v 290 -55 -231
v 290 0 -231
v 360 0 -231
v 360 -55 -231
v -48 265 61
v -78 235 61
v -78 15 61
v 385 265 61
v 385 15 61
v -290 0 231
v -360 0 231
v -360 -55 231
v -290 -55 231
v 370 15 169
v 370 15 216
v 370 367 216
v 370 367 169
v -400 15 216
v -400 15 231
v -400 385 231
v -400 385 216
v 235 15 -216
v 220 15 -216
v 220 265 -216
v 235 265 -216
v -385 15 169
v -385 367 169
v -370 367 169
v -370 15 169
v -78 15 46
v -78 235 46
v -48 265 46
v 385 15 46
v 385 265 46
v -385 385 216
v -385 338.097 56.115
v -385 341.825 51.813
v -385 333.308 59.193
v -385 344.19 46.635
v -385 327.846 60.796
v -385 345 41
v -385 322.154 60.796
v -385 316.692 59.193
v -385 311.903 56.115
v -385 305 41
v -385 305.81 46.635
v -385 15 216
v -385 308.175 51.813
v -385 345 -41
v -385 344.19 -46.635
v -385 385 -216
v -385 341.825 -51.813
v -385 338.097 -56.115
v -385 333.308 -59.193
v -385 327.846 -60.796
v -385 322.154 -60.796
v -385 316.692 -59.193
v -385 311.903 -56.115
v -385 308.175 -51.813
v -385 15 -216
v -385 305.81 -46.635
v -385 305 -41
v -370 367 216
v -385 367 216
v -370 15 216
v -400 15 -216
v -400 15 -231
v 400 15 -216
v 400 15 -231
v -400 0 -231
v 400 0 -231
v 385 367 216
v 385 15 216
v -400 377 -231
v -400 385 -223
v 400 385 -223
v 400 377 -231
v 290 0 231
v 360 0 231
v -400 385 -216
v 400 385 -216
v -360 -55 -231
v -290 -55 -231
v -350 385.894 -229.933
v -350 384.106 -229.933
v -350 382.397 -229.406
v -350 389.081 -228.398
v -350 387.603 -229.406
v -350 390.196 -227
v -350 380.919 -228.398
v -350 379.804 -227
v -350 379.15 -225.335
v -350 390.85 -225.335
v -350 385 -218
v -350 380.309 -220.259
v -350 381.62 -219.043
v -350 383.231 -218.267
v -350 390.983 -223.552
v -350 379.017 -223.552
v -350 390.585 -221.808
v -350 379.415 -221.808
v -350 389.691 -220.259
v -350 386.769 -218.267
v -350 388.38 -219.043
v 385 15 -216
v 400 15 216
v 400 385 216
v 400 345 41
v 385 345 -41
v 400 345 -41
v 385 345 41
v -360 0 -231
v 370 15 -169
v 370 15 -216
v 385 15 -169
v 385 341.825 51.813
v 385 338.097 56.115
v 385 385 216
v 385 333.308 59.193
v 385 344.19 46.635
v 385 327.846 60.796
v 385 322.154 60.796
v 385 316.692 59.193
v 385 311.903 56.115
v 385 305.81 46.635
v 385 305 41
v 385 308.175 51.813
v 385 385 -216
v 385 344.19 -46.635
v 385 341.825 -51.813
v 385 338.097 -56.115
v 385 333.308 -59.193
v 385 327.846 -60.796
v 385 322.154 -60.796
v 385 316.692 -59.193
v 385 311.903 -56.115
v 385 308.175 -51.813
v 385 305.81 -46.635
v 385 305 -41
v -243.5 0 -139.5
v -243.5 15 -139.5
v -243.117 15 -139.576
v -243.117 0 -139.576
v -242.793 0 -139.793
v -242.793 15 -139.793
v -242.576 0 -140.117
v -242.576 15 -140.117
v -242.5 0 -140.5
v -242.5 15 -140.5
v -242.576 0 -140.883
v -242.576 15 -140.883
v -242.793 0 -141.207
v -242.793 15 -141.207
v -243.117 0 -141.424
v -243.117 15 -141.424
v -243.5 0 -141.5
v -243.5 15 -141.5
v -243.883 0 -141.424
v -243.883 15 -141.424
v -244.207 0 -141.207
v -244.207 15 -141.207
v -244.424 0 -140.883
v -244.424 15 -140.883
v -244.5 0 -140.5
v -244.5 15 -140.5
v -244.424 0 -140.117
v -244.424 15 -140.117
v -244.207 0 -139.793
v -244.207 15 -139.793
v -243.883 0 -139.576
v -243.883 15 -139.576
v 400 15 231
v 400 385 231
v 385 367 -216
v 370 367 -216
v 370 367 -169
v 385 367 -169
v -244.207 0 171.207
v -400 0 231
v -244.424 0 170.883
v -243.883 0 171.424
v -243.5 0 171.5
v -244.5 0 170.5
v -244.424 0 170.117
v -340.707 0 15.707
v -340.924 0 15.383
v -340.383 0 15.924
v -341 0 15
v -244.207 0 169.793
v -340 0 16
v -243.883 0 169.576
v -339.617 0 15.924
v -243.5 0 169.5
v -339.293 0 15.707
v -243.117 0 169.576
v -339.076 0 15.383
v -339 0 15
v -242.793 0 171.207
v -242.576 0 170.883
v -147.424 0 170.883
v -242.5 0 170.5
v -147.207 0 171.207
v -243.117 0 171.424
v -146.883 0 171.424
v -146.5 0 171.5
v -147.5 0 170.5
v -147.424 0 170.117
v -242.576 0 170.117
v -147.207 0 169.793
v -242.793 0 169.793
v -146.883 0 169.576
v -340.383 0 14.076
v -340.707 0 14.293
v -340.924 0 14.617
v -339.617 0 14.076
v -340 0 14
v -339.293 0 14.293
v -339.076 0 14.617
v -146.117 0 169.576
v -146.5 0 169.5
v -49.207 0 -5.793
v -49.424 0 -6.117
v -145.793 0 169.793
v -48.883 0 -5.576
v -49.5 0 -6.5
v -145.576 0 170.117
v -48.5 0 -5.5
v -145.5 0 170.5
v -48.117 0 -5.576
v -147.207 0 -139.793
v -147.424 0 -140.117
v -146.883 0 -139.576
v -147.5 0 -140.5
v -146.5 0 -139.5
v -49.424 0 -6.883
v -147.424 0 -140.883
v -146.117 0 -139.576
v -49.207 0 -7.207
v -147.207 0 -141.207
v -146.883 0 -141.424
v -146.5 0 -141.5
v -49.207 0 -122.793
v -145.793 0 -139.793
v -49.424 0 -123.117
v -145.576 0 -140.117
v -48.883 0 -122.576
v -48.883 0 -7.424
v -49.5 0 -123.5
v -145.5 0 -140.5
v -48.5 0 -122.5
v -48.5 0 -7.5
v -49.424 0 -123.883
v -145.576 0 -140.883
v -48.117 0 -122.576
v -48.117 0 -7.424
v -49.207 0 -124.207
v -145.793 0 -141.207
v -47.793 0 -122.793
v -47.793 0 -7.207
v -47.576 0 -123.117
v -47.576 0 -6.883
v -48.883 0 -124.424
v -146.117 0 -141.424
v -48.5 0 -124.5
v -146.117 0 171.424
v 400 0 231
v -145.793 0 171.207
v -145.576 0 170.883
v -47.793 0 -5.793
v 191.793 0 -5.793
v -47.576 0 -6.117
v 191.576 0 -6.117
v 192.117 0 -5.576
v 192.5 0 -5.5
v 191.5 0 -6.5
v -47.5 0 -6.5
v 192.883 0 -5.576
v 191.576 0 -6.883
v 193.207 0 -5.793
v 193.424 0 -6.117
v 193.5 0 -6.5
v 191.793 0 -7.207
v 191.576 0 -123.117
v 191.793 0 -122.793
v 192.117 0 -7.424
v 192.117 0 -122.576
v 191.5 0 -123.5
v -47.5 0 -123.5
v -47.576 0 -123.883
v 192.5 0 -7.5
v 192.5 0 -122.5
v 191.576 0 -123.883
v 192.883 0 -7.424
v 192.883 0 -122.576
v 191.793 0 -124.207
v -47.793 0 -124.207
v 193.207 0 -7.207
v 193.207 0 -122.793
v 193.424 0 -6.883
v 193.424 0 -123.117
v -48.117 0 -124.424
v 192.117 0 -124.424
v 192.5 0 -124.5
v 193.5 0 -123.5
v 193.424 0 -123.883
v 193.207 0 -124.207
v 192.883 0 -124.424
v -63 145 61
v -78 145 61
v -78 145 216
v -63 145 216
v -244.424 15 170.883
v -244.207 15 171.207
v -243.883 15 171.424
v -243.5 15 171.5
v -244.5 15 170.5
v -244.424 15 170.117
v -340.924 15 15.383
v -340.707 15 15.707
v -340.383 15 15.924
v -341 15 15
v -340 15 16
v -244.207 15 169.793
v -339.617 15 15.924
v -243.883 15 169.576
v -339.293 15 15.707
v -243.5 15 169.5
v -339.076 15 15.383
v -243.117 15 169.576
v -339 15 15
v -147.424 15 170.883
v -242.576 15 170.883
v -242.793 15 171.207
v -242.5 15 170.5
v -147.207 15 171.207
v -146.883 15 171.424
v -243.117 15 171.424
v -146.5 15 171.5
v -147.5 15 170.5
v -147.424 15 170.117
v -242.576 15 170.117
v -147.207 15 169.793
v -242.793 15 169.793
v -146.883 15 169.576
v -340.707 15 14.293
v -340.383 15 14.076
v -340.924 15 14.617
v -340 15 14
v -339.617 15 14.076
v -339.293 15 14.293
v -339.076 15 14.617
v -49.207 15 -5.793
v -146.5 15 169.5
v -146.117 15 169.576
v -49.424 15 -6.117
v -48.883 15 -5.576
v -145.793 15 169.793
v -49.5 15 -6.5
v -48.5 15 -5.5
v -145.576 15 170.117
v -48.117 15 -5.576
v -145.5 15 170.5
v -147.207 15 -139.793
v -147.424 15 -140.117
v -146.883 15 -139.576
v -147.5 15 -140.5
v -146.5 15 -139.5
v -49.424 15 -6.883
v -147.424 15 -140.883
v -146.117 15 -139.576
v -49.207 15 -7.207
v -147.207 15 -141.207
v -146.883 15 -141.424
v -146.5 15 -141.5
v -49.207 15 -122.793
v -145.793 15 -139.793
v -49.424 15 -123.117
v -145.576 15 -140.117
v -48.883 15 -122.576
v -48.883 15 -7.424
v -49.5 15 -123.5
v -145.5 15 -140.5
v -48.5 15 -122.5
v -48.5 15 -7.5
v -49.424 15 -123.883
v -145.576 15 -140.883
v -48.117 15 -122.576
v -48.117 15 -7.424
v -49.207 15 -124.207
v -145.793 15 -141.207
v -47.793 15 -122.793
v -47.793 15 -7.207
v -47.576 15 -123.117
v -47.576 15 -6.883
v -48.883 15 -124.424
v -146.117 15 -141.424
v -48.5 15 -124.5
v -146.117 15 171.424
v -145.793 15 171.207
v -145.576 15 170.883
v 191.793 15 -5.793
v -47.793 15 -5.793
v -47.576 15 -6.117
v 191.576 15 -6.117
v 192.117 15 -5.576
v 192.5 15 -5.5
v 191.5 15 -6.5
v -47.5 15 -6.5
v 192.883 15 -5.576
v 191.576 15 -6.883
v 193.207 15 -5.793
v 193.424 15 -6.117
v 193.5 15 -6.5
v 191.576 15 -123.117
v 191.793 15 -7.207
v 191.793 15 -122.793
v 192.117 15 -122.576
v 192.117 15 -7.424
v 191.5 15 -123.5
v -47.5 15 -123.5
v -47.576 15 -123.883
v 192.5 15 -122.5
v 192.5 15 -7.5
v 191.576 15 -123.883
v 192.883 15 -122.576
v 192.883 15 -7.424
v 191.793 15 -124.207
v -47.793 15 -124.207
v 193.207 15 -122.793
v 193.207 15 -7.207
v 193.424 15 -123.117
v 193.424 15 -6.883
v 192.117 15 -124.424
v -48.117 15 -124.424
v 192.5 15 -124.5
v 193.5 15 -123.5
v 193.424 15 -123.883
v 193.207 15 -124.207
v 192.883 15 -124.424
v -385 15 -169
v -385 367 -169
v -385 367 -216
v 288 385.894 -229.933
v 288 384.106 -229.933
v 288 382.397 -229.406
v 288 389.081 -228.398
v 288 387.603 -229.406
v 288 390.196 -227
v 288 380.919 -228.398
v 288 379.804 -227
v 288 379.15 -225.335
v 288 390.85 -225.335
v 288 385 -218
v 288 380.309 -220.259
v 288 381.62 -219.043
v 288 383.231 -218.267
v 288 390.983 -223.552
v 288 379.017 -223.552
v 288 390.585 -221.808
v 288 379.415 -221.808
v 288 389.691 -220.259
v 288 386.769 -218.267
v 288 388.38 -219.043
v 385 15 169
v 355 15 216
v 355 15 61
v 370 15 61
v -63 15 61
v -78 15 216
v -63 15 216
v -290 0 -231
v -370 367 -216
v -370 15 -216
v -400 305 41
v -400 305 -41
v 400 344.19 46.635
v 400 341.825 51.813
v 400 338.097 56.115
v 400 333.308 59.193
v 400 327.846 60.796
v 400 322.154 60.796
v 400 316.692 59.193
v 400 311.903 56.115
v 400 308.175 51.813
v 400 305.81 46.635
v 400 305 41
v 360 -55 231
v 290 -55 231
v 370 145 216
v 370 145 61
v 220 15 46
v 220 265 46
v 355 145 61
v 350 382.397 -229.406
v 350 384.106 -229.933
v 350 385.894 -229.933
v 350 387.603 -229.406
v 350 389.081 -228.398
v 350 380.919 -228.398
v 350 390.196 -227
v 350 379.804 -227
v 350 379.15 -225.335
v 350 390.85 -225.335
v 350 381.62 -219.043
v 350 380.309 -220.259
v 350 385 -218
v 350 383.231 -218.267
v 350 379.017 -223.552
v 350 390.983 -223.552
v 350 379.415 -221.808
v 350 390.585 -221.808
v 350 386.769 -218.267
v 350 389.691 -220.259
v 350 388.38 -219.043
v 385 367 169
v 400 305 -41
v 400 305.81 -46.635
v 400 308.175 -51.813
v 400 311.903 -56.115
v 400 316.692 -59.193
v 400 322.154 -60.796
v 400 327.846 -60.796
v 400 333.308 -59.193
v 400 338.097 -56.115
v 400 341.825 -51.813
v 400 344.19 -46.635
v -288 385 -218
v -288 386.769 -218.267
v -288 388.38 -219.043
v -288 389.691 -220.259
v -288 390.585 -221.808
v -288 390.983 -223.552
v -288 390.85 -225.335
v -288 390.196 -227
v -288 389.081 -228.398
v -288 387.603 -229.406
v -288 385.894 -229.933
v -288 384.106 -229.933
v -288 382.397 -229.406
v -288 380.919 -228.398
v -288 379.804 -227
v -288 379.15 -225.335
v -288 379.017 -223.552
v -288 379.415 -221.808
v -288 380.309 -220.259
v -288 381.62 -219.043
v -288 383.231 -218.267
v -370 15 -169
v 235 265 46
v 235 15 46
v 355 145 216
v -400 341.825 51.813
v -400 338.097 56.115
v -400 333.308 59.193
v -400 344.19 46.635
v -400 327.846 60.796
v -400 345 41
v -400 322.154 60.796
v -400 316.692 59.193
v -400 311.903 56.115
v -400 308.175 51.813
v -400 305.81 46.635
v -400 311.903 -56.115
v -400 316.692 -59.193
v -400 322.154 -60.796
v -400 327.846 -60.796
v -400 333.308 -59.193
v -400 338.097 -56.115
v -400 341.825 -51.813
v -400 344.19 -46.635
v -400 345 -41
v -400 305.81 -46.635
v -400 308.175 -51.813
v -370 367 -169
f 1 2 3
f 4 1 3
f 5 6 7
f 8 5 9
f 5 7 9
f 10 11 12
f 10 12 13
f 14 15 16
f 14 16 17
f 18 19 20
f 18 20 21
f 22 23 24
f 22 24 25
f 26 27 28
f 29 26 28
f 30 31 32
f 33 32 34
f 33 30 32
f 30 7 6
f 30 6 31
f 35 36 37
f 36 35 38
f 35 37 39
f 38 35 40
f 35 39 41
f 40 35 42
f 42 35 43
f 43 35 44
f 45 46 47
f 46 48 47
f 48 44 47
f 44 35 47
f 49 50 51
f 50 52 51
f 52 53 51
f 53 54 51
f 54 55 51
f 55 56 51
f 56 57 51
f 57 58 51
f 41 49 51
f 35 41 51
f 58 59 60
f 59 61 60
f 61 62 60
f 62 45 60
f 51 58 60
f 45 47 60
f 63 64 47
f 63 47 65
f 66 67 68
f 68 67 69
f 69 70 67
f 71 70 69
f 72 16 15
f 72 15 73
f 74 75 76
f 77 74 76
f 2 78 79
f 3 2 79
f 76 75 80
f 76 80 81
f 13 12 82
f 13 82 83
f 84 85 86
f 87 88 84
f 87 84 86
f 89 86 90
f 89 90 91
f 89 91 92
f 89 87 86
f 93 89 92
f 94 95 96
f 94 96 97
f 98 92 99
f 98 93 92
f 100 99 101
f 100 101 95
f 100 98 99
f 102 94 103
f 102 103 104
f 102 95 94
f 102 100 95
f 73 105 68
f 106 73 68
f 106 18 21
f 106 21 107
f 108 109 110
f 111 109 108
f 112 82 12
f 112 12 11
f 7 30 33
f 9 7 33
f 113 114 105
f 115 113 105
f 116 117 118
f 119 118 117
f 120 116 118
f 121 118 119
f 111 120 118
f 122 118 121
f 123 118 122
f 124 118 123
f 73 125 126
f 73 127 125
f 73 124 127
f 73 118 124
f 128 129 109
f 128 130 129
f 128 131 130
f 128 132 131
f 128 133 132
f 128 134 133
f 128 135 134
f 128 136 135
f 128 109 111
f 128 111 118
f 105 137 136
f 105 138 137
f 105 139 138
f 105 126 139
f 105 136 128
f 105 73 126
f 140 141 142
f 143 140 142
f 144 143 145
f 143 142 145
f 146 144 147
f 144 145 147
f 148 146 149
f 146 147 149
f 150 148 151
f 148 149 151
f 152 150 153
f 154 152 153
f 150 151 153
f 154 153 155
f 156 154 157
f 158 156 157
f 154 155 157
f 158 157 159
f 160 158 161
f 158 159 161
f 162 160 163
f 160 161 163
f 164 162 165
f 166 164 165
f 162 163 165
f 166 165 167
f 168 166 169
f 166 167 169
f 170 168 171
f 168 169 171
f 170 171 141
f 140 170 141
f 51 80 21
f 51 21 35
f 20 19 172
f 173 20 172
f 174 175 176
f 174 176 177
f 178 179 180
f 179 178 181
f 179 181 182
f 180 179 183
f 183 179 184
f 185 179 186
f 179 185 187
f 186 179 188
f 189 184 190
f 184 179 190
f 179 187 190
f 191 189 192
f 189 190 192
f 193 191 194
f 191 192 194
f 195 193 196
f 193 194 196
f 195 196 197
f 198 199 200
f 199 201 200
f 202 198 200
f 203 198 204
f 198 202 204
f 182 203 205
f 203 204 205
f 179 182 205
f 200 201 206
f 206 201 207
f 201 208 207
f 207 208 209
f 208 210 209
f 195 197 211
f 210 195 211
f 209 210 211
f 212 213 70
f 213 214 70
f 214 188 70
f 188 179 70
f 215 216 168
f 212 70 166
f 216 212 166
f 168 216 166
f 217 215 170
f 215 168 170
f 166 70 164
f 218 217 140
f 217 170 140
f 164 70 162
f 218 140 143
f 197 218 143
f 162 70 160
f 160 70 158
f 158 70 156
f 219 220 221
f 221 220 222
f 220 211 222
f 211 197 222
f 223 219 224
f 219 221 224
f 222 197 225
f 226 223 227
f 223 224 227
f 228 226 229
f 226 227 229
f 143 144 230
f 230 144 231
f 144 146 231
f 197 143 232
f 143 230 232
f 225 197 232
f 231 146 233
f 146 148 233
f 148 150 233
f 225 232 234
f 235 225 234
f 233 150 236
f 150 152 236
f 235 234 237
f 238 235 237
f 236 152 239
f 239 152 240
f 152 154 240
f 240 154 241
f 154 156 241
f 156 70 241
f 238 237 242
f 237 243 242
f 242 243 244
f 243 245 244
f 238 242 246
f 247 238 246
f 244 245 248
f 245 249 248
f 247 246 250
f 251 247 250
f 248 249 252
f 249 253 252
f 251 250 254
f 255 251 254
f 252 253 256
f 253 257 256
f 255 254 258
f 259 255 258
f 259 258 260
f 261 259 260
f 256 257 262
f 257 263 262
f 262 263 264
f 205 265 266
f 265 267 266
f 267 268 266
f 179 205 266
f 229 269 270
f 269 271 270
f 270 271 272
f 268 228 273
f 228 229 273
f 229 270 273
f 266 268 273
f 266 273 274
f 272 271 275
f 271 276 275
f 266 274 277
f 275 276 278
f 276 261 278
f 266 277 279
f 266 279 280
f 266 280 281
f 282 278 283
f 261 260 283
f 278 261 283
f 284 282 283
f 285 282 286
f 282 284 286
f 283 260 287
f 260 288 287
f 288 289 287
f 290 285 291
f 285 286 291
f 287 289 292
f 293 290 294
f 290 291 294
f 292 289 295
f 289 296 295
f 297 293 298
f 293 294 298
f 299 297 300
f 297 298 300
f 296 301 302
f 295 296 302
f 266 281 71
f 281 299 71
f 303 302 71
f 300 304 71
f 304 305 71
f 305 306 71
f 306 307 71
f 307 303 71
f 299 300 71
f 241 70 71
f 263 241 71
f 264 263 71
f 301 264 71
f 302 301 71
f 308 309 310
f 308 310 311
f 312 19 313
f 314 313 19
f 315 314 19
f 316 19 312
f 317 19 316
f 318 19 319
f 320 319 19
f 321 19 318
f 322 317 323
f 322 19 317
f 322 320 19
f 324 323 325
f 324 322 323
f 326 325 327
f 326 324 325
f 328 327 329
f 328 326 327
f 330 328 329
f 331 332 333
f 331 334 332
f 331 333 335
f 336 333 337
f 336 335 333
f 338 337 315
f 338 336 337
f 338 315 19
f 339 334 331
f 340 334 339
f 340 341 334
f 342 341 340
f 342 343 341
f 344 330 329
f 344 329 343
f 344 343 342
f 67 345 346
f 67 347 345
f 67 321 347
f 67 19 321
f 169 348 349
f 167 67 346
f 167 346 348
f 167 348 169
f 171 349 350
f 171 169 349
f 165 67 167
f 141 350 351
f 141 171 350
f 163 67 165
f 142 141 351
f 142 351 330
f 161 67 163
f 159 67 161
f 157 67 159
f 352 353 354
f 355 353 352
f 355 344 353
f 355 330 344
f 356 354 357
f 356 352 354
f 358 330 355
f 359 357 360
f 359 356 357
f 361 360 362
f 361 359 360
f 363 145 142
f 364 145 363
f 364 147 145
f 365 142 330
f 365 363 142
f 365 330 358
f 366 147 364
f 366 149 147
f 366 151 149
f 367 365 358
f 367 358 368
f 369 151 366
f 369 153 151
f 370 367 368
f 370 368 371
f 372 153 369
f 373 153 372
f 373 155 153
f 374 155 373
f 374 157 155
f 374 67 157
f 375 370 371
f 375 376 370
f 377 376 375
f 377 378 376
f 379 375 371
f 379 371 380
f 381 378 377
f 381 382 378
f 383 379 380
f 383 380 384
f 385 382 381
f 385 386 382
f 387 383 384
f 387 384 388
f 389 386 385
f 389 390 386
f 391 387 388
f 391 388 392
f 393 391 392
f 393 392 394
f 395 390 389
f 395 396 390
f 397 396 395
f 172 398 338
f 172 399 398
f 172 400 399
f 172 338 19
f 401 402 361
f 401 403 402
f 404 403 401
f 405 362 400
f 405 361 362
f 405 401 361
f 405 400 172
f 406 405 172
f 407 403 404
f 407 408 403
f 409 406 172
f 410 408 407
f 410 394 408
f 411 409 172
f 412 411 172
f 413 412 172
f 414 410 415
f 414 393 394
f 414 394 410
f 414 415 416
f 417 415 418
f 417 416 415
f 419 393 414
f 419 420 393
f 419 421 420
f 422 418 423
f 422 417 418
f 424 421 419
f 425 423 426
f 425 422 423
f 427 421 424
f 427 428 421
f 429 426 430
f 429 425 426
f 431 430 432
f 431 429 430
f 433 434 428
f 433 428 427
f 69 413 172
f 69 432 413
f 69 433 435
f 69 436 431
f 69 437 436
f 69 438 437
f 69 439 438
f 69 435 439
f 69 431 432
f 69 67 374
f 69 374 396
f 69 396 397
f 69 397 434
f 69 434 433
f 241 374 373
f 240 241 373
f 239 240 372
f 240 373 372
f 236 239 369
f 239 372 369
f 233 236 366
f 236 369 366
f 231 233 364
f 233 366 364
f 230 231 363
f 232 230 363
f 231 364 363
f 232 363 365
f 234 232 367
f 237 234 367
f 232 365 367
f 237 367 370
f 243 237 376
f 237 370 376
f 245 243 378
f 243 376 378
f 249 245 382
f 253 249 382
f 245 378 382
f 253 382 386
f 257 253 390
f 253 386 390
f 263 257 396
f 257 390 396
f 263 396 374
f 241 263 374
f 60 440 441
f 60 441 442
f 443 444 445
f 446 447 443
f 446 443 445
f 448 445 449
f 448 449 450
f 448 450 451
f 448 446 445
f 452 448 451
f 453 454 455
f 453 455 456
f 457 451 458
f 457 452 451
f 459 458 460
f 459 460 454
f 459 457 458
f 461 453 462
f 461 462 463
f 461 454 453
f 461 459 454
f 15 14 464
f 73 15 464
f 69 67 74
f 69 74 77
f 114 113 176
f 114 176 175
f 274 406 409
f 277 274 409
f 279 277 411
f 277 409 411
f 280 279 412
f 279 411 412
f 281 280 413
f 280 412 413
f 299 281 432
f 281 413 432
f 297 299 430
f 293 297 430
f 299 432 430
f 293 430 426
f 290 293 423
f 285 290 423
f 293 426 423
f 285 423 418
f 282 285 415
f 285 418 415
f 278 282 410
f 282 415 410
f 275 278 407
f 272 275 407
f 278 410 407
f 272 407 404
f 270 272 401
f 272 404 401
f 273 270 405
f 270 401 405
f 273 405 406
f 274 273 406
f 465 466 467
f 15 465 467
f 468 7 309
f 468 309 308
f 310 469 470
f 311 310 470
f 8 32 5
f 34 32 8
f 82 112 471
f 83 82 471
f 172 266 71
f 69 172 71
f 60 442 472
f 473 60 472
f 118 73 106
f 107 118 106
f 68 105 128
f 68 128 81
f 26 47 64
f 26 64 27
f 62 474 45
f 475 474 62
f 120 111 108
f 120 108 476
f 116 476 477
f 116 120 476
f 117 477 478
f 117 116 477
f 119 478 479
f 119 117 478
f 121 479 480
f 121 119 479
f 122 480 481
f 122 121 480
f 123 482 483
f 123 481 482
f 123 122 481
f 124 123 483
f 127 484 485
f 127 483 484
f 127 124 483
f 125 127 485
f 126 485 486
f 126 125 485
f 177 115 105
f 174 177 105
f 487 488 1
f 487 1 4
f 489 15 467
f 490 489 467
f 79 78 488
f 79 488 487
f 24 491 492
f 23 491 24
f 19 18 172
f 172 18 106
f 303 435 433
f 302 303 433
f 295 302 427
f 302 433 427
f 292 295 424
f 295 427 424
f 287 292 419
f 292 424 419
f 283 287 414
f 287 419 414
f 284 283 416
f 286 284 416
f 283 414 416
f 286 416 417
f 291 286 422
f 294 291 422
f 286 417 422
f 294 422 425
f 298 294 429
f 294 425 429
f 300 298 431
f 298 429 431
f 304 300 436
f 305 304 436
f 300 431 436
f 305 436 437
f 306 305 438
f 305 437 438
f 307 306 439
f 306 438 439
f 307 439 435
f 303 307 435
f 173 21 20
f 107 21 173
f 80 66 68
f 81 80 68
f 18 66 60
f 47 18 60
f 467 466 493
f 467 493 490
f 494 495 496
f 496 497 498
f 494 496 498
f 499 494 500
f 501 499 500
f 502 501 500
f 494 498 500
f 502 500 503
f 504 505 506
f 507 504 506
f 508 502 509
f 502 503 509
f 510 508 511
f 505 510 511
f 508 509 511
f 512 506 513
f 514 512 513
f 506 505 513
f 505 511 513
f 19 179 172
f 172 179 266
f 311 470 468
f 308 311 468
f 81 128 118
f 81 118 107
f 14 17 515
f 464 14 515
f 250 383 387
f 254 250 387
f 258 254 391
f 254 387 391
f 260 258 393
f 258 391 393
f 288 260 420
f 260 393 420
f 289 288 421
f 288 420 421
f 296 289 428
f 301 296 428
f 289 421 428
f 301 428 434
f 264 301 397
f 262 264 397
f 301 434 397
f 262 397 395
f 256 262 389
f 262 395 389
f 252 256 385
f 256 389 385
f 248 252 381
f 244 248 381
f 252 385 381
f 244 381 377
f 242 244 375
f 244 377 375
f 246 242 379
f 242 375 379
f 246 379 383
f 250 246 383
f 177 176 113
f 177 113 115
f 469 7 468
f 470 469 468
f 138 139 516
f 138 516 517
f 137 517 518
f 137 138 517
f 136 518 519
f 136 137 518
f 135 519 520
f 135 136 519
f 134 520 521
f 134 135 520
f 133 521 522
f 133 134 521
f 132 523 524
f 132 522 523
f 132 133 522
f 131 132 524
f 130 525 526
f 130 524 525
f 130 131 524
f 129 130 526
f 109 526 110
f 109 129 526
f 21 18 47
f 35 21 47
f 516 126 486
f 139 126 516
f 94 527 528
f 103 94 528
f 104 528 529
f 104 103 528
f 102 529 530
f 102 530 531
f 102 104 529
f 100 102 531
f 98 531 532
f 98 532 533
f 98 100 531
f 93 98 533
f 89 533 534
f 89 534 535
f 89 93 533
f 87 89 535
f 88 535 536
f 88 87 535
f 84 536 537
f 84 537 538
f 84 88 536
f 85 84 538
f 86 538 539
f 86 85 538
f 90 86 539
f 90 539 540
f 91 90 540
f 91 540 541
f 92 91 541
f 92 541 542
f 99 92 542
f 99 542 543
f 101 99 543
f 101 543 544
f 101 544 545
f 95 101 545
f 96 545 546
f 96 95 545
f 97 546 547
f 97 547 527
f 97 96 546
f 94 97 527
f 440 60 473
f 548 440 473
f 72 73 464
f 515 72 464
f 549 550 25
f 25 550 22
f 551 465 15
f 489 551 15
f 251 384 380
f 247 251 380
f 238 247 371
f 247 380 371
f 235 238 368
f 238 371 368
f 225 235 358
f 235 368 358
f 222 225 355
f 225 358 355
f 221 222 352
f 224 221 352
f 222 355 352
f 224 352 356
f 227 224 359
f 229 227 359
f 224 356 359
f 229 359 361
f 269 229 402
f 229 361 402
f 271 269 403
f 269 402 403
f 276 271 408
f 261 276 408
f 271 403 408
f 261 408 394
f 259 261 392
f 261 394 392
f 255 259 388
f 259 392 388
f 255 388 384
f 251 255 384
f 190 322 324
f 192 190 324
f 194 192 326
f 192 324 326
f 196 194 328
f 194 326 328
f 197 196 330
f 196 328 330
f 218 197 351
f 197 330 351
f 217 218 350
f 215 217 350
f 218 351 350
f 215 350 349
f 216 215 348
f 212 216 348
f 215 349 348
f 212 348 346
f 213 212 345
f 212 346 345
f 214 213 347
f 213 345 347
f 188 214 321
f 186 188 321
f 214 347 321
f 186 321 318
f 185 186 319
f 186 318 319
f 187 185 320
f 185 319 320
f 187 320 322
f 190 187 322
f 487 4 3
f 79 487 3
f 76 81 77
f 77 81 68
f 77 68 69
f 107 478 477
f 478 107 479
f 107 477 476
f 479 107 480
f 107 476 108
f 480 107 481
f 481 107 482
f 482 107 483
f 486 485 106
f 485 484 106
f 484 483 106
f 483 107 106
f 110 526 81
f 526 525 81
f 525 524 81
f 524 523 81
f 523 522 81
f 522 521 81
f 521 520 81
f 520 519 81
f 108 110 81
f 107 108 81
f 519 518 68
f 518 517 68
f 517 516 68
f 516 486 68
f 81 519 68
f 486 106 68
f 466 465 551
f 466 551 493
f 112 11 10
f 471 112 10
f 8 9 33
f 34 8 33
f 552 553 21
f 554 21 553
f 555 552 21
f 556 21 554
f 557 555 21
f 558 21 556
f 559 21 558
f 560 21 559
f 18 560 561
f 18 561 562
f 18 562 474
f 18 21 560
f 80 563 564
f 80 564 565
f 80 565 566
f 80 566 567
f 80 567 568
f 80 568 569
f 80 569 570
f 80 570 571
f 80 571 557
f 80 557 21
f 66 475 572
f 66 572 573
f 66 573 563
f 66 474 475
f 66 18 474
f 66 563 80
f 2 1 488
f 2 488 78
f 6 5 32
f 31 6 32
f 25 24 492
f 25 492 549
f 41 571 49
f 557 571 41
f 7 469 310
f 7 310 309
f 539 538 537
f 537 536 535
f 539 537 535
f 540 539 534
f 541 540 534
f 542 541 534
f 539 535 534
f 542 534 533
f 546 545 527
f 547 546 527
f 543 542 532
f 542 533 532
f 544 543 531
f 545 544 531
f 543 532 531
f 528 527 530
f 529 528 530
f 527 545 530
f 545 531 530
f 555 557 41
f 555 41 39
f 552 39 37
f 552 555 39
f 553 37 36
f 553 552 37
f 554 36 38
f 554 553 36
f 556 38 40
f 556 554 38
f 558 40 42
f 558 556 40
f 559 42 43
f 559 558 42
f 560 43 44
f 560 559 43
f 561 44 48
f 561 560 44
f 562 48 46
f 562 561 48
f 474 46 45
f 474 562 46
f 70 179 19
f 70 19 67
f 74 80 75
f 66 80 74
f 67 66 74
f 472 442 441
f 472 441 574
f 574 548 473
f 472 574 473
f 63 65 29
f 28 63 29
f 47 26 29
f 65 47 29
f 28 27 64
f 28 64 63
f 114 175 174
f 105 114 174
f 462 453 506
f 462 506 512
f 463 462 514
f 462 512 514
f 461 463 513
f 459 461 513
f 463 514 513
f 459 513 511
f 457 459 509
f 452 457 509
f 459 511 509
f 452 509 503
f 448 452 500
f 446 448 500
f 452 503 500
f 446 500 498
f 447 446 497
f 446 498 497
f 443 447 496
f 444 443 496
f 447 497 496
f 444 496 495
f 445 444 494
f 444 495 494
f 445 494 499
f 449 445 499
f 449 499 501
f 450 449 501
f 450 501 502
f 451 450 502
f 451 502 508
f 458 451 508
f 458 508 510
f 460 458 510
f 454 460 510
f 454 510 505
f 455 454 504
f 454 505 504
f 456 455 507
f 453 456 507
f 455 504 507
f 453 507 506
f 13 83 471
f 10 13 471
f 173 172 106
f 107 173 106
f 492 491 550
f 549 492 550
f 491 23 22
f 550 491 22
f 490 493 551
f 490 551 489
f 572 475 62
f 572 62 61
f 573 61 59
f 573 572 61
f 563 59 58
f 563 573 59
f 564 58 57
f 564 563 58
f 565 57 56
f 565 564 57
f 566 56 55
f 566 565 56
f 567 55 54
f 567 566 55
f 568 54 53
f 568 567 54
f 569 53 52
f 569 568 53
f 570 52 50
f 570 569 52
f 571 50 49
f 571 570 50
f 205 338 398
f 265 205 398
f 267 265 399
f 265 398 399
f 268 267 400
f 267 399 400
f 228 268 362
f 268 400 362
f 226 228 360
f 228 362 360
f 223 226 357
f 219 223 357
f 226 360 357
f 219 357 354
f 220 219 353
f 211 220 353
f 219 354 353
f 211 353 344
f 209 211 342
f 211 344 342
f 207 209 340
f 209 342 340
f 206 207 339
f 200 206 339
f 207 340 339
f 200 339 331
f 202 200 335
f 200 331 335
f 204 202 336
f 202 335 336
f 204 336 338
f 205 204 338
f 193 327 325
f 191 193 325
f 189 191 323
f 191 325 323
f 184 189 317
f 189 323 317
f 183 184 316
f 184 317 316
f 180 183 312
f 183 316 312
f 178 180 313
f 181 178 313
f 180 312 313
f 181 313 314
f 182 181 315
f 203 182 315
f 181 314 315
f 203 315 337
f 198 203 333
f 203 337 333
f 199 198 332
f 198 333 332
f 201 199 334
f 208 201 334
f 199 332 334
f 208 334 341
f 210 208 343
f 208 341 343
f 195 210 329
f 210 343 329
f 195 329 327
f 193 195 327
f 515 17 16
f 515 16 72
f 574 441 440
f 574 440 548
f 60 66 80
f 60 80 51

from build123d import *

# Parameters (mm, degrees)
ESQUISSE1_W             = 800
ESQUISSE1_H             = 462
BOSS_EXTRU_1_DEPTH      = 15
ESQUISSE2_W             = 70
ESQUISSE2_H             = 55
BOSS_EXTRU_2_DEPTH      = 462
BOSS_EXTRU_2_2_DEPTH    = 462
ESQUISSE3_W             = 800
ESQUISSE3_H             = 15
BOSS_EXTRU_3_DEPTH      = 370
BOSS_EXTRU_3_2_DEPTH    = 370
ESQUISSE4_W             = 15
ESQUISSE4_H             = 432
BOSS_EXTRU_4_DEPTH      = 370
BOSS_EXTRU_4_2_DEPTH    = 370
ESQUISSE5_W             = 15
ESQUISSE5_H             = 47
BOSS_EXTRU_5_DEPTH      = 352
BOSS_EXTRU_5_2_DEPTH    = 352
BOSS_EXTRU_5_3_DEPTH    = 352
BOSS_EXTRU_5_4_DEPTH    = 352
ENL_V_MAT_EXTRU_1_DEPTH = 918.3799649
BOSS_EXTRU_7_START      = -50
ESQUISSE8_R             = 6
BOSS_EXTRU_7_DEPTH      = 62
CHANFREIN1_SIZE         = 8
ESQUISSE9_W             = 15
ESQUISSE9_H             = 155
BOSS_EXTRU_8_DEPTH      = 130
BOSS_EXTRU_8_2_DEPTH    = 130
ESQUISSE10_W            = 463
ESQUISSE10_H            = 15
BOSS_EXTRU_9_DEPTH      = 250
ESQUISSE11_W            = 15
ESQUISSE11_H            = 262
BOSS_EXTRU_10_DEPTH     = 250
CHANFREIN2_SIZE         = 30
ESQUISSE12_R            = 1
ENL_V_MAT_EXTRU_2_DEPTH = 15


with BuildPart() as part:
    # Esquisse1 → Boss.-Extru.1 (new body)
    with BuildSketch(Plane(origin=(0, 0, 0), x_dir=(1, 0, 0), z_dir=(0, 1, 0))):
        Rectangle(ESQUISSE1_W, ESQUISSE1_H)
    extrude(amount=BOSS_EXTRU_1_DEPTH)

    # Esquisse12 → Enlèv. mat.-Extru.2 (cut)
    with BuildSketch(Plane(origin=(0, 15, 0), x_dir=(1, 0, 0), z_dir=(0, 1, 0))):
        with Locations(Location((-243.5, 140.5, 0), (0, 0, 270))):
            Circle(ESQUISSE12_R)
        with Locations(Location((-48.5, 123.5, 0), (0, 0, 270))):
            Circle(ESQUISSE12_R)
        with Locations(Location((-146.5, 140.5, 0), (0, 0, 90))):
            Circle(ESQUISSE12_R)
        with Locations(Location((192.5, 123.5, 0), (0, 0, 90))):
            Circle(ESQUISSE12_R)
        with Locations(Location((-48.5, 6.5, 0), (0, 0, 90))):
            Circle(ESQUISSE12_R)
        with Locations(Location((192.5, 6.5, 0), (0, 0, 270))):
            Circle(ESQUISSE12_R)
        with Locations(Location((-243.5, -170.5, 0), (0, 0, 90))):
            Circle(ESQUISSE12_R)
        with Locations(Location((-146.5, -170.5, 0), (0, 0, 270))):
            Circle(ESQUISSE12_R)
        with Locations(Location((-340, -15, 0), (0, 0, 270))):
            Circle(ESQUISSE12_R)
    extrude(amount=-ENL_V_MAT_EXTRU_2_DEPTH, mode=Mode.SUBTRACT)


with BuildPart() as body_2:
    # Esquisse2 → Boss.-Extru.2 (new body)
    with BuildSketch(Plane.XY.offset(231)):
        with Locations((-325, -27.5)):
            Rectangle(ESQUISSE2_W, ESQUISSE2_H)
    extrude(amount=-BOSS_EXTRU_2_DEPTH)


with BuildPart() as body_3:
    # Esquisse2 → Boss.-Extru.2 2 (new body)
    with BuildSketch(Plane.XY.offset(231)):
        with Locations((325, -27.5)):
            Rectangle(ESQUISSE2_W, ESQUISSE2_H)
    extrude(amount=-BOSS_EXTRU_2_2_DEPTH)


with BuildPart() as body_4:
    # Esquisse3 → Boss.-Extru.3 (new body)
    with BuildSketch(Plane(origin=(0, 15, 0), x_dir=(1, 0, 0), z_dir=(0, 1, 0))):
        with Locations((0, 223.5)):
            Rectangle(ESQUISSE3_W, ESQUISSE3_H)
    extrude(amount=BOSS_EXTRU_3_DEPTH)

    # Chanfrein1
    chanfrein1_edges = [body_4.edges().sort_by_distance(p)[0] for p in [
        (0, 385, -231),
    ]]
    chamfer(chanfrein1_edges, length=CHANFREIN1_SIZE)


with BuildPart() as body_5:
    # Esquisse3 → Boss.-Extru.3 2 (new body)
    with BuildSketch(Plane(origin=(0, 15, 0), x_dir=(1, 0, 0), z_dir=(0, 1, 0))):
        with Locations((0, -223.5)):
            Rectangle(ESQUISSE3_W, ESQUISSE3_H)
    extrude(amount=BOSS_EXTRU_3_2_DEPTH)


with BuildPart() as body_6:
    # Esquisse4 → Boss.-Extru.4 (new body)
    with BuildSketch(Plane(origin=(0, 15, 0), x_dir=(1, 0, 0), z_dir=(0, 1, 0))):
        with Locations((-392.5, 0)):
            Rectangle(ESQUISSE4_W, ESQUISSE4_H)
    extrude(amount=BOSS_EXTRU_4_DEPTH)


with BuildPart() as body_7:
    # Esquisse4 → Boss.-Extru.4 2 (new body)
    with BuildSketch(Plane(origin=(0, 15, 0), x_dir=(1, 0, 0), z_dir=(0, 1, 0))):
        with Locations((392.5, 0)):
            Rectangle(ESQUISSE4_W, ESQUISSE4_H)
    extrude(amount=BOSS_EXTRU_4_2_DEPTH)


with BuildPart() as body_8:
    # Esquisse5 → Boss.-Extru.5 (new body)
    with BuildSketch(Plane(origin=(0, 15, 0), x_dir=(1, 0, 0), z_dir=(0, 1, 0))):
        with Locations((-377.5, 192.5)):
            Rectangle(ESQUISSE5_W, ESQUISSE5_H)
    extrude(amount=BOSS_EXTRU_5_DEPTH)


with BuildPart() as body_9:
    # Esquisse5 → Boss.-Extru.5 2 (new body)
    with BuildSketch(Plane(origin=(0, 15, 0), x_dir=(1, 0, 0), z_dir=(0, 1, 0))):
        with Locations((-377.5, -192.5)):
            Rectangle(ESQUISSE5_W, ESQUISSE5_H)
    extrude(amount=BOSS_EXTRU_5_2_DEPTH)


with BuildPart() as body_10:
    # Esquisse5 → Boss.-Extru.5 3 (new body)
    with BuildSketch(Plane(origin=(0, 15, 0), x_dir=(1, 0, 0), z_dir=(0, 1, 0))):
        with Locations((377.5, -192.5)):
            Rectangle(ESQUISSE5_W, ESQUISSE5_H)
    extrude(amount=BOSS_EXTRU_5_3_DEPTH)


with BuildPart() as body_11:
    # Esquisse5 → Boss.-Extru.5 4 (new body)
    with BuildSketch(Plane(origin=(0, 15, 0), x_dir=(1, 0, 0), z_dir=(0, 1, 0))):
        with Locations((377.5, 192.5)):
            Rectangle(ESQUISSE5_W, ESQUISSE5_H)
    extrude(amount=BOSS_EXTRU_5_4_DEPTH)


with BuildPart() as enl_v_mat_extru_1_tool:
    # Esquisse6 → Enlèv. mat.-Extru.1 (new, through all)
    with BuildSketch(Plane.ZY.offset(400)):
        with BuildLine():
            Line((-41, 345), (41, 345))
            ThreePointArc((41, 345), (61, 325), (41, 305))
            Line((41, 305), (-41, 305))
            ThreePointArc((-41, 305), (-61, 325), (-41, 345))
        make_face()
    extrude(amount=-ENL_V_MAT_EXTRU_1_DEPTH)


with BuildPart() as body_6_1:
    add(body_6.part)

    # Enlèv. mat.-Extru.1: cut by enl_v_mat_extru_1_tool
    add(enl_v_mat_extru_1_tool.part, mode=Mode.SUBTRACT)


with BuildPart() as body_7_1:
    add(body_7.part)

    # Enlèv. mat.-Extru.1: cut by enl_v_mat_extru_1_tool
    add(enl_v_mat_extru_1_tool.part, mode=Mode.SUBTRACT)


with BuildPart() as body_12:
    # Esquisse8 → Boss.-Extru.7 (new body)
    with BuildSketch(Plane.ZY.offset(400).offset(BOSS_EXTRU_7_START)):
        with Locations((-224, 385)):
            Circle(ESQUISSE8_R)
    extrude(amount=-BOSS_EXTRU_7_DEPTH)


with BuildPart() as body_13:
    # Symétrie3: mirrored copy
    add(body_12.part.mirror(Plane(origin=(0, 0, 0), x_dir=(0, 0, 1), z_dir=(1, 0, 0))))


with BuildPart() as body_14:
    # Esquisse9 → Boss.-Extru.8 (new body)
    with BuildSketch(Plane(origin=(0, 15, 0), x_dir=(1, 0, 0), z_dir=(0, 1, 0))):
        with Locations((-70.5, -138.5)):
            Rectangle(ESQUISSE9_W, ESQUISSE9_H)
    extrude(amount=BOSS_EXTRU_8_DEPTH)


with BuildPart() as body_15:
    # Esquisse9 → Boss.-Extru.8 2 (new body)
    with BuildSketch(Plane(origin=(0, 15, 0), x_dir=(1, 0, 0), z_dir=(0, 1, 0))):
        with Locations((362.5, -138.5)):
            Rectangle(ESQUISSE9_W, ESQUISSE9_H)
    extrude(amount=BOSS_EXTRU_8_2_DEPTH)


with BuildPart() as body_16:
    # Esquisse10 → Boss.-Extru.9 (new body)
    with BuildSketch(Plane(origin=(0, 15, 0), x_dir=(1, 0, 0), z_dir=(0, 1, 0))):
        with Locations((153.5, -53.5)):
            Rectangle(ESQUISSE10_W, ESQUISSE10_H)
    extrude(amount=BOSS_EXTRU_9_DEPTH)

    # Chanfrein2
    chanfrein2_edges = [body_16.edges().sort_by_distance(p)[0] for p in [
        (-78, 265, 53.5),
    ]]
    chamfer(chanfrein2_edges, length=CHANFREIN2_SIZE)


with BuildPart() as body_17:
    # Esquisse11 → Boss.-Extru.10 (new body)
    with BuildSketch(Plane(origin=(0, 15, 0), x_dir=(1, 0, 0), z_dir=(0, 1, 0))):
        with Locations((227.5, 85)):
            Rectangle(ESQUISSE11_W, ESQUISSE11_H)
    extrude(amount=BOSS_EXTRU_10_DEPTH)


solid = Compound([part.part, body_2.part, body_3.part, body_4.part, body_5.part, body_8.part, body_9.part, body_10.part, body_11.part, body_6_1.part, body_7_1.part, body_12.part, body_13.part, body_14.part, body_15.part, body_16.part, body_17.part])
